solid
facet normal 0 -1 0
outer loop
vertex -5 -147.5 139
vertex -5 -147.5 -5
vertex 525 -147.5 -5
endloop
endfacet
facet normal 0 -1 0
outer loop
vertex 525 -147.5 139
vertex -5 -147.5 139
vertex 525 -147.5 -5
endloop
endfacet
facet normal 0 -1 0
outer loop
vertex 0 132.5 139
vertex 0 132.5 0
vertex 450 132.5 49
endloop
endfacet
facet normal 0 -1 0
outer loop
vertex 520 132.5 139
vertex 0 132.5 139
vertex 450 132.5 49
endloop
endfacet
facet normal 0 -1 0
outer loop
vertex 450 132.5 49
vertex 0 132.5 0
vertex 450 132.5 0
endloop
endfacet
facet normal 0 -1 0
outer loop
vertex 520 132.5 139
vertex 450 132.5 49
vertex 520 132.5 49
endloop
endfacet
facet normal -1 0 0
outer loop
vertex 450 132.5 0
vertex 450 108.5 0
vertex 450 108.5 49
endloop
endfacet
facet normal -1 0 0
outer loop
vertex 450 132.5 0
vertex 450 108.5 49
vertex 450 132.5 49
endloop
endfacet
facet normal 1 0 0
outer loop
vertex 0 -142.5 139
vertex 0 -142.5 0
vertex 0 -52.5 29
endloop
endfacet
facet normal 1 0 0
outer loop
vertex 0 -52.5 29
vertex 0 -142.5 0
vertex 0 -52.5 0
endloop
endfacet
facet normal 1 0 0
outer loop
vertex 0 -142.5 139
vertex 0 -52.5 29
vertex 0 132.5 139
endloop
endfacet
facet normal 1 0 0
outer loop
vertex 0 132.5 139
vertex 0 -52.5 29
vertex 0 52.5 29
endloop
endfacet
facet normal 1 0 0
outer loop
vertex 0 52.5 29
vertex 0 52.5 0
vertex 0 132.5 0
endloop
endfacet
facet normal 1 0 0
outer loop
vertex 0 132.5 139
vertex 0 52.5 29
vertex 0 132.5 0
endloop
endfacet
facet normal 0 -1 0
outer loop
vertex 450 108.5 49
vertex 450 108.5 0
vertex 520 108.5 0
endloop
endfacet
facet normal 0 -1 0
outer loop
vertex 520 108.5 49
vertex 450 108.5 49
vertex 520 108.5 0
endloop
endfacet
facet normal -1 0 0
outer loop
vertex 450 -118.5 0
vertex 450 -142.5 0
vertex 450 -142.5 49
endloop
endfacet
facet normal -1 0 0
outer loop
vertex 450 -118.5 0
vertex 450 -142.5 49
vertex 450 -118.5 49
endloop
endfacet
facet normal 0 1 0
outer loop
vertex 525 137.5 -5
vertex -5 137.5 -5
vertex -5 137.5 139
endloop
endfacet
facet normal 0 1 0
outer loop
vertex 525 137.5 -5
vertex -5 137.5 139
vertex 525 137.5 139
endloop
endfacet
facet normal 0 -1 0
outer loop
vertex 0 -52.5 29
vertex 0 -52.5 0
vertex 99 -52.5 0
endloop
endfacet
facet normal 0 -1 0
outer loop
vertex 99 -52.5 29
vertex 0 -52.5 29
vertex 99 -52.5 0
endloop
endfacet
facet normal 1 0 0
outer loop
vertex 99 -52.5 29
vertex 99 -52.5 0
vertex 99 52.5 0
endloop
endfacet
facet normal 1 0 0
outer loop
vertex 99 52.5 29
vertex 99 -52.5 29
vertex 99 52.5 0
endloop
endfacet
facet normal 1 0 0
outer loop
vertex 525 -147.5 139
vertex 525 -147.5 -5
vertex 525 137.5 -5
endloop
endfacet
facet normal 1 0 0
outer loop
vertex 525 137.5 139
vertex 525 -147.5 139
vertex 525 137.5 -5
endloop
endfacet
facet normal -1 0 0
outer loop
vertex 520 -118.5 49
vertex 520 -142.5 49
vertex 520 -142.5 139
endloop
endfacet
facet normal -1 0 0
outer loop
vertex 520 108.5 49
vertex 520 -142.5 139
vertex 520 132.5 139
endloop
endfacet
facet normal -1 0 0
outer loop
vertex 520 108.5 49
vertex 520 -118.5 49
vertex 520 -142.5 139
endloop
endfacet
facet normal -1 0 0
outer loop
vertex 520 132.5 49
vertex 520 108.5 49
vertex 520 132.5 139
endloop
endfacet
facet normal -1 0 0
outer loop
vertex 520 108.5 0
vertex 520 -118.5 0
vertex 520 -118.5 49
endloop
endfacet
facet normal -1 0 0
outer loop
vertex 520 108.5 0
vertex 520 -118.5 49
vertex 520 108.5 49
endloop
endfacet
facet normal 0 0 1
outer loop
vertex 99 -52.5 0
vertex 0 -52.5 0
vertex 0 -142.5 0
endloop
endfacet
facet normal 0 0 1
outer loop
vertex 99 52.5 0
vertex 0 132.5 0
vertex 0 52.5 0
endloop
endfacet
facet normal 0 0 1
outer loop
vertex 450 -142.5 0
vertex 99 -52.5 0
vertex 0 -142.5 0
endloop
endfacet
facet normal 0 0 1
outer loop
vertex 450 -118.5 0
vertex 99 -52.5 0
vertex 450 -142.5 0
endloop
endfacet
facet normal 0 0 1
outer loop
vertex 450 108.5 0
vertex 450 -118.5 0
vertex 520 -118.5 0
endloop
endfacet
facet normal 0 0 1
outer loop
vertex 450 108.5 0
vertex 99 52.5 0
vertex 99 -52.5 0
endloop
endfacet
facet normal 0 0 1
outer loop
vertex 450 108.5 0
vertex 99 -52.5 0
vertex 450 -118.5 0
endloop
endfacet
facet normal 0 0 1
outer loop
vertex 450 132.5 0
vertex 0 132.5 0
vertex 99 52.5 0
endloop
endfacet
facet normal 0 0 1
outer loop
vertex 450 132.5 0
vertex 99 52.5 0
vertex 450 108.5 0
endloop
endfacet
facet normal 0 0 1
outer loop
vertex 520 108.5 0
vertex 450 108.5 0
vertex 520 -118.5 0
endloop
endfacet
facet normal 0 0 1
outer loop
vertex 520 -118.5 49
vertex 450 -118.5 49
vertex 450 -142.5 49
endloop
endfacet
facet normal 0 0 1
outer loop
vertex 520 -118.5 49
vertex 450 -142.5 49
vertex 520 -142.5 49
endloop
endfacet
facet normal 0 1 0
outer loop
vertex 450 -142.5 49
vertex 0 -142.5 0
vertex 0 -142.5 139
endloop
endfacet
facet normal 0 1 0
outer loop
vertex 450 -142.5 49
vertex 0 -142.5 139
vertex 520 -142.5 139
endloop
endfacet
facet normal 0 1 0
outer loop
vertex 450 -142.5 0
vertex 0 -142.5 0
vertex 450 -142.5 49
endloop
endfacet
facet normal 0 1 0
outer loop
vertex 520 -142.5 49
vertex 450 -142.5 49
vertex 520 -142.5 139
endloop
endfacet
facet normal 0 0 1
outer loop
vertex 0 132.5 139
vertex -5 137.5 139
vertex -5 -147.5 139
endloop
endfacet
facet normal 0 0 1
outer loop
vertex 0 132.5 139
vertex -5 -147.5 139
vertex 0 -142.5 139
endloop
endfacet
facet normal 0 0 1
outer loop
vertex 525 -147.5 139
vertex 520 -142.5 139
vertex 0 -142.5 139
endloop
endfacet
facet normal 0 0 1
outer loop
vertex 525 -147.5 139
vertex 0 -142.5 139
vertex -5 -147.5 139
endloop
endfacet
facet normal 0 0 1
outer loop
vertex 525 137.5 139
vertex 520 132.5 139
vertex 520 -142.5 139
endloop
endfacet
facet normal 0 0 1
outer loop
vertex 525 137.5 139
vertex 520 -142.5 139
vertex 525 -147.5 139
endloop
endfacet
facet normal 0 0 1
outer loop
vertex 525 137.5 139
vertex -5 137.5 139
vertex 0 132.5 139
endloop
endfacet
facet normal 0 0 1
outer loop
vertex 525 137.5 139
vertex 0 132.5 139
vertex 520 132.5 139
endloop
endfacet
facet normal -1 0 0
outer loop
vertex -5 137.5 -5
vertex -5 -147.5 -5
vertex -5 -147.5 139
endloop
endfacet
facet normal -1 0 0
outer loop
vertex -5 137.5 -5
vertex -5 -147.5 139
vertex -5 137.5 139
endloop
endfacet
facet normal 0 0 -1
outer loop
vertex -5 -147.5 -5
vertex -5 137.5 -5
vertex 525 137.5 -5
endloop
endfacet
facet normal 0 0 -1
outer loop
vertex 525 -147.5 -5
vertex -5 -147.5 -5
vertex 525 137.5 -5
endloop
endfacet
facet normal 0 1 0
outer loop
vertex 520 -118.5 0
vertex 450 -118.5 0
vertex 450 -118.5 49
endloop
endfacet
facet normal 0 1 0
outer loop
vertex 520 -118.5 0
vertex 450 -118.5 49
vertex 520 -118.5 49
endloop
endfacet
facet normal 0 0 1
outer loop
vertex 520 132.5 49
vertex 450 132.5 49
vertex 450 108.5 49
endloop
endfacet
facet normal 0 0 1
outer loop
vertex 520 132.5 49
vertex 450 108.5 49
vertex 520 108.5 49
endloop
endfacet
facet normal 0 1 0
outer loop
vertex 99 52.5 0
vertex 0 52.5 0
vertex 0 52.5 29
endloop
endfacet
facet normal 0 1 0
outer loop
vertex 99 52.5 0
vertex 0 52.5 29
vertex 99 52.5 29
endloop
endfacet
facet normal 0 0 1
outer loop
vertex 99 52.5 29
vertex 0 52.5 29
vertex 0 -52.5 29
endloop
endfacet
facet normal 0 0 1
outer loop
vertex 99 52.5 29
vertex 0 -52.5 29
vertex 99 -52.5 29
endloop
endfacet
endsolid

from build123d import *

# Parameters (mm, degrees)
BOX003_W     = 71
BOX003_H     = 25
BOX003_DEPTH = 50
BOX004_W     = 71
BOX004_H     = 25
BOX004_DEPTH = 50
BOX002_W     = 100
BOX002_H     = 105
BOX002_DEPTH = 30
BOX001_W     = 520
BOX001_H     = 275
BOX001_DEPTH = 140
BOX005_W     = 530
BOX005_H     = 285
BOX005_DEPTH = 144


with BuildPart() as wheelhole1:
    # Box003 → Box003 (new body)
    with BuildSketch(Plane(origin=(450, -1, -1), x_dir=(1, 0, 0), z_dir=(0, 0, 1))):
        with Locations((35.5, 12.5)):
            Rectangle(BOX003_W, BOX003_H)
    extrude(amount=BOX003_DEPTH)


with BuildPart() as wheelhole2:
    # Box004 → Box004 (new body)
    with BuildSketch(Plane(origin=(450, 251, -1), x_dir=(1, 0, 0), z_dir=(0, 0, 1))):
        with Locations((35.5, 12.5)):
            Rectangle(BOX004_W, BOX004_H)
    extrude(amount=BOX004_DEPTH)


with BuildPart() as fusion:
    # Box002 → Box002 (new body)
    with BuildSketch(Plane(origin=(-1, 90, -1), x_dir=(1, 0, 0), z_dir=(0, 0, 1))):
        with Locations((50, 52.5)):
            Rectangle(BOX002_W, BOX002_H)
    extrude(amount=BOX002_DEPTH)

    # Fusion: union wheelhole1, wheelhole2
    add(wheelhole1.part)
    add(wheelhole2.part)


with BuildPart() as cavity:
    # Box001 → Box001 (new body)
    with BuildSketch(Plane.XY):
        with Locations((260, 137.5)):
            Rectangle(BOX001_W, BOX001_H)
    extrude(amount=BOX001_DEPTH)

    # Cut: cut Fusion
    add(fusion.part, mode=Mode.SUBTRACT)


with BuildPart() as suitcase:
    # Box005 → Box005 (new body)
    with BuildSketch(Plane(origin=(-5, -5, -5), x_dir=(1, 0, 0), z_dir=(0, 0, 1))):
        with Locations((265, 142.5)):
            Rectangle(BOX005_W, BOX005_H)
    extrude(amount=BOX005_DEPTH)

    # Cut001: cut cavity
    add(cavity.part, mode=Mode.SUBTRACT)


with BuildPart() as suitcase_1:
    # Cut001 placement: moved
    add(suitcase.part.moved(Location((0, -142.5, 0))))


solid = suitcase_1.part
